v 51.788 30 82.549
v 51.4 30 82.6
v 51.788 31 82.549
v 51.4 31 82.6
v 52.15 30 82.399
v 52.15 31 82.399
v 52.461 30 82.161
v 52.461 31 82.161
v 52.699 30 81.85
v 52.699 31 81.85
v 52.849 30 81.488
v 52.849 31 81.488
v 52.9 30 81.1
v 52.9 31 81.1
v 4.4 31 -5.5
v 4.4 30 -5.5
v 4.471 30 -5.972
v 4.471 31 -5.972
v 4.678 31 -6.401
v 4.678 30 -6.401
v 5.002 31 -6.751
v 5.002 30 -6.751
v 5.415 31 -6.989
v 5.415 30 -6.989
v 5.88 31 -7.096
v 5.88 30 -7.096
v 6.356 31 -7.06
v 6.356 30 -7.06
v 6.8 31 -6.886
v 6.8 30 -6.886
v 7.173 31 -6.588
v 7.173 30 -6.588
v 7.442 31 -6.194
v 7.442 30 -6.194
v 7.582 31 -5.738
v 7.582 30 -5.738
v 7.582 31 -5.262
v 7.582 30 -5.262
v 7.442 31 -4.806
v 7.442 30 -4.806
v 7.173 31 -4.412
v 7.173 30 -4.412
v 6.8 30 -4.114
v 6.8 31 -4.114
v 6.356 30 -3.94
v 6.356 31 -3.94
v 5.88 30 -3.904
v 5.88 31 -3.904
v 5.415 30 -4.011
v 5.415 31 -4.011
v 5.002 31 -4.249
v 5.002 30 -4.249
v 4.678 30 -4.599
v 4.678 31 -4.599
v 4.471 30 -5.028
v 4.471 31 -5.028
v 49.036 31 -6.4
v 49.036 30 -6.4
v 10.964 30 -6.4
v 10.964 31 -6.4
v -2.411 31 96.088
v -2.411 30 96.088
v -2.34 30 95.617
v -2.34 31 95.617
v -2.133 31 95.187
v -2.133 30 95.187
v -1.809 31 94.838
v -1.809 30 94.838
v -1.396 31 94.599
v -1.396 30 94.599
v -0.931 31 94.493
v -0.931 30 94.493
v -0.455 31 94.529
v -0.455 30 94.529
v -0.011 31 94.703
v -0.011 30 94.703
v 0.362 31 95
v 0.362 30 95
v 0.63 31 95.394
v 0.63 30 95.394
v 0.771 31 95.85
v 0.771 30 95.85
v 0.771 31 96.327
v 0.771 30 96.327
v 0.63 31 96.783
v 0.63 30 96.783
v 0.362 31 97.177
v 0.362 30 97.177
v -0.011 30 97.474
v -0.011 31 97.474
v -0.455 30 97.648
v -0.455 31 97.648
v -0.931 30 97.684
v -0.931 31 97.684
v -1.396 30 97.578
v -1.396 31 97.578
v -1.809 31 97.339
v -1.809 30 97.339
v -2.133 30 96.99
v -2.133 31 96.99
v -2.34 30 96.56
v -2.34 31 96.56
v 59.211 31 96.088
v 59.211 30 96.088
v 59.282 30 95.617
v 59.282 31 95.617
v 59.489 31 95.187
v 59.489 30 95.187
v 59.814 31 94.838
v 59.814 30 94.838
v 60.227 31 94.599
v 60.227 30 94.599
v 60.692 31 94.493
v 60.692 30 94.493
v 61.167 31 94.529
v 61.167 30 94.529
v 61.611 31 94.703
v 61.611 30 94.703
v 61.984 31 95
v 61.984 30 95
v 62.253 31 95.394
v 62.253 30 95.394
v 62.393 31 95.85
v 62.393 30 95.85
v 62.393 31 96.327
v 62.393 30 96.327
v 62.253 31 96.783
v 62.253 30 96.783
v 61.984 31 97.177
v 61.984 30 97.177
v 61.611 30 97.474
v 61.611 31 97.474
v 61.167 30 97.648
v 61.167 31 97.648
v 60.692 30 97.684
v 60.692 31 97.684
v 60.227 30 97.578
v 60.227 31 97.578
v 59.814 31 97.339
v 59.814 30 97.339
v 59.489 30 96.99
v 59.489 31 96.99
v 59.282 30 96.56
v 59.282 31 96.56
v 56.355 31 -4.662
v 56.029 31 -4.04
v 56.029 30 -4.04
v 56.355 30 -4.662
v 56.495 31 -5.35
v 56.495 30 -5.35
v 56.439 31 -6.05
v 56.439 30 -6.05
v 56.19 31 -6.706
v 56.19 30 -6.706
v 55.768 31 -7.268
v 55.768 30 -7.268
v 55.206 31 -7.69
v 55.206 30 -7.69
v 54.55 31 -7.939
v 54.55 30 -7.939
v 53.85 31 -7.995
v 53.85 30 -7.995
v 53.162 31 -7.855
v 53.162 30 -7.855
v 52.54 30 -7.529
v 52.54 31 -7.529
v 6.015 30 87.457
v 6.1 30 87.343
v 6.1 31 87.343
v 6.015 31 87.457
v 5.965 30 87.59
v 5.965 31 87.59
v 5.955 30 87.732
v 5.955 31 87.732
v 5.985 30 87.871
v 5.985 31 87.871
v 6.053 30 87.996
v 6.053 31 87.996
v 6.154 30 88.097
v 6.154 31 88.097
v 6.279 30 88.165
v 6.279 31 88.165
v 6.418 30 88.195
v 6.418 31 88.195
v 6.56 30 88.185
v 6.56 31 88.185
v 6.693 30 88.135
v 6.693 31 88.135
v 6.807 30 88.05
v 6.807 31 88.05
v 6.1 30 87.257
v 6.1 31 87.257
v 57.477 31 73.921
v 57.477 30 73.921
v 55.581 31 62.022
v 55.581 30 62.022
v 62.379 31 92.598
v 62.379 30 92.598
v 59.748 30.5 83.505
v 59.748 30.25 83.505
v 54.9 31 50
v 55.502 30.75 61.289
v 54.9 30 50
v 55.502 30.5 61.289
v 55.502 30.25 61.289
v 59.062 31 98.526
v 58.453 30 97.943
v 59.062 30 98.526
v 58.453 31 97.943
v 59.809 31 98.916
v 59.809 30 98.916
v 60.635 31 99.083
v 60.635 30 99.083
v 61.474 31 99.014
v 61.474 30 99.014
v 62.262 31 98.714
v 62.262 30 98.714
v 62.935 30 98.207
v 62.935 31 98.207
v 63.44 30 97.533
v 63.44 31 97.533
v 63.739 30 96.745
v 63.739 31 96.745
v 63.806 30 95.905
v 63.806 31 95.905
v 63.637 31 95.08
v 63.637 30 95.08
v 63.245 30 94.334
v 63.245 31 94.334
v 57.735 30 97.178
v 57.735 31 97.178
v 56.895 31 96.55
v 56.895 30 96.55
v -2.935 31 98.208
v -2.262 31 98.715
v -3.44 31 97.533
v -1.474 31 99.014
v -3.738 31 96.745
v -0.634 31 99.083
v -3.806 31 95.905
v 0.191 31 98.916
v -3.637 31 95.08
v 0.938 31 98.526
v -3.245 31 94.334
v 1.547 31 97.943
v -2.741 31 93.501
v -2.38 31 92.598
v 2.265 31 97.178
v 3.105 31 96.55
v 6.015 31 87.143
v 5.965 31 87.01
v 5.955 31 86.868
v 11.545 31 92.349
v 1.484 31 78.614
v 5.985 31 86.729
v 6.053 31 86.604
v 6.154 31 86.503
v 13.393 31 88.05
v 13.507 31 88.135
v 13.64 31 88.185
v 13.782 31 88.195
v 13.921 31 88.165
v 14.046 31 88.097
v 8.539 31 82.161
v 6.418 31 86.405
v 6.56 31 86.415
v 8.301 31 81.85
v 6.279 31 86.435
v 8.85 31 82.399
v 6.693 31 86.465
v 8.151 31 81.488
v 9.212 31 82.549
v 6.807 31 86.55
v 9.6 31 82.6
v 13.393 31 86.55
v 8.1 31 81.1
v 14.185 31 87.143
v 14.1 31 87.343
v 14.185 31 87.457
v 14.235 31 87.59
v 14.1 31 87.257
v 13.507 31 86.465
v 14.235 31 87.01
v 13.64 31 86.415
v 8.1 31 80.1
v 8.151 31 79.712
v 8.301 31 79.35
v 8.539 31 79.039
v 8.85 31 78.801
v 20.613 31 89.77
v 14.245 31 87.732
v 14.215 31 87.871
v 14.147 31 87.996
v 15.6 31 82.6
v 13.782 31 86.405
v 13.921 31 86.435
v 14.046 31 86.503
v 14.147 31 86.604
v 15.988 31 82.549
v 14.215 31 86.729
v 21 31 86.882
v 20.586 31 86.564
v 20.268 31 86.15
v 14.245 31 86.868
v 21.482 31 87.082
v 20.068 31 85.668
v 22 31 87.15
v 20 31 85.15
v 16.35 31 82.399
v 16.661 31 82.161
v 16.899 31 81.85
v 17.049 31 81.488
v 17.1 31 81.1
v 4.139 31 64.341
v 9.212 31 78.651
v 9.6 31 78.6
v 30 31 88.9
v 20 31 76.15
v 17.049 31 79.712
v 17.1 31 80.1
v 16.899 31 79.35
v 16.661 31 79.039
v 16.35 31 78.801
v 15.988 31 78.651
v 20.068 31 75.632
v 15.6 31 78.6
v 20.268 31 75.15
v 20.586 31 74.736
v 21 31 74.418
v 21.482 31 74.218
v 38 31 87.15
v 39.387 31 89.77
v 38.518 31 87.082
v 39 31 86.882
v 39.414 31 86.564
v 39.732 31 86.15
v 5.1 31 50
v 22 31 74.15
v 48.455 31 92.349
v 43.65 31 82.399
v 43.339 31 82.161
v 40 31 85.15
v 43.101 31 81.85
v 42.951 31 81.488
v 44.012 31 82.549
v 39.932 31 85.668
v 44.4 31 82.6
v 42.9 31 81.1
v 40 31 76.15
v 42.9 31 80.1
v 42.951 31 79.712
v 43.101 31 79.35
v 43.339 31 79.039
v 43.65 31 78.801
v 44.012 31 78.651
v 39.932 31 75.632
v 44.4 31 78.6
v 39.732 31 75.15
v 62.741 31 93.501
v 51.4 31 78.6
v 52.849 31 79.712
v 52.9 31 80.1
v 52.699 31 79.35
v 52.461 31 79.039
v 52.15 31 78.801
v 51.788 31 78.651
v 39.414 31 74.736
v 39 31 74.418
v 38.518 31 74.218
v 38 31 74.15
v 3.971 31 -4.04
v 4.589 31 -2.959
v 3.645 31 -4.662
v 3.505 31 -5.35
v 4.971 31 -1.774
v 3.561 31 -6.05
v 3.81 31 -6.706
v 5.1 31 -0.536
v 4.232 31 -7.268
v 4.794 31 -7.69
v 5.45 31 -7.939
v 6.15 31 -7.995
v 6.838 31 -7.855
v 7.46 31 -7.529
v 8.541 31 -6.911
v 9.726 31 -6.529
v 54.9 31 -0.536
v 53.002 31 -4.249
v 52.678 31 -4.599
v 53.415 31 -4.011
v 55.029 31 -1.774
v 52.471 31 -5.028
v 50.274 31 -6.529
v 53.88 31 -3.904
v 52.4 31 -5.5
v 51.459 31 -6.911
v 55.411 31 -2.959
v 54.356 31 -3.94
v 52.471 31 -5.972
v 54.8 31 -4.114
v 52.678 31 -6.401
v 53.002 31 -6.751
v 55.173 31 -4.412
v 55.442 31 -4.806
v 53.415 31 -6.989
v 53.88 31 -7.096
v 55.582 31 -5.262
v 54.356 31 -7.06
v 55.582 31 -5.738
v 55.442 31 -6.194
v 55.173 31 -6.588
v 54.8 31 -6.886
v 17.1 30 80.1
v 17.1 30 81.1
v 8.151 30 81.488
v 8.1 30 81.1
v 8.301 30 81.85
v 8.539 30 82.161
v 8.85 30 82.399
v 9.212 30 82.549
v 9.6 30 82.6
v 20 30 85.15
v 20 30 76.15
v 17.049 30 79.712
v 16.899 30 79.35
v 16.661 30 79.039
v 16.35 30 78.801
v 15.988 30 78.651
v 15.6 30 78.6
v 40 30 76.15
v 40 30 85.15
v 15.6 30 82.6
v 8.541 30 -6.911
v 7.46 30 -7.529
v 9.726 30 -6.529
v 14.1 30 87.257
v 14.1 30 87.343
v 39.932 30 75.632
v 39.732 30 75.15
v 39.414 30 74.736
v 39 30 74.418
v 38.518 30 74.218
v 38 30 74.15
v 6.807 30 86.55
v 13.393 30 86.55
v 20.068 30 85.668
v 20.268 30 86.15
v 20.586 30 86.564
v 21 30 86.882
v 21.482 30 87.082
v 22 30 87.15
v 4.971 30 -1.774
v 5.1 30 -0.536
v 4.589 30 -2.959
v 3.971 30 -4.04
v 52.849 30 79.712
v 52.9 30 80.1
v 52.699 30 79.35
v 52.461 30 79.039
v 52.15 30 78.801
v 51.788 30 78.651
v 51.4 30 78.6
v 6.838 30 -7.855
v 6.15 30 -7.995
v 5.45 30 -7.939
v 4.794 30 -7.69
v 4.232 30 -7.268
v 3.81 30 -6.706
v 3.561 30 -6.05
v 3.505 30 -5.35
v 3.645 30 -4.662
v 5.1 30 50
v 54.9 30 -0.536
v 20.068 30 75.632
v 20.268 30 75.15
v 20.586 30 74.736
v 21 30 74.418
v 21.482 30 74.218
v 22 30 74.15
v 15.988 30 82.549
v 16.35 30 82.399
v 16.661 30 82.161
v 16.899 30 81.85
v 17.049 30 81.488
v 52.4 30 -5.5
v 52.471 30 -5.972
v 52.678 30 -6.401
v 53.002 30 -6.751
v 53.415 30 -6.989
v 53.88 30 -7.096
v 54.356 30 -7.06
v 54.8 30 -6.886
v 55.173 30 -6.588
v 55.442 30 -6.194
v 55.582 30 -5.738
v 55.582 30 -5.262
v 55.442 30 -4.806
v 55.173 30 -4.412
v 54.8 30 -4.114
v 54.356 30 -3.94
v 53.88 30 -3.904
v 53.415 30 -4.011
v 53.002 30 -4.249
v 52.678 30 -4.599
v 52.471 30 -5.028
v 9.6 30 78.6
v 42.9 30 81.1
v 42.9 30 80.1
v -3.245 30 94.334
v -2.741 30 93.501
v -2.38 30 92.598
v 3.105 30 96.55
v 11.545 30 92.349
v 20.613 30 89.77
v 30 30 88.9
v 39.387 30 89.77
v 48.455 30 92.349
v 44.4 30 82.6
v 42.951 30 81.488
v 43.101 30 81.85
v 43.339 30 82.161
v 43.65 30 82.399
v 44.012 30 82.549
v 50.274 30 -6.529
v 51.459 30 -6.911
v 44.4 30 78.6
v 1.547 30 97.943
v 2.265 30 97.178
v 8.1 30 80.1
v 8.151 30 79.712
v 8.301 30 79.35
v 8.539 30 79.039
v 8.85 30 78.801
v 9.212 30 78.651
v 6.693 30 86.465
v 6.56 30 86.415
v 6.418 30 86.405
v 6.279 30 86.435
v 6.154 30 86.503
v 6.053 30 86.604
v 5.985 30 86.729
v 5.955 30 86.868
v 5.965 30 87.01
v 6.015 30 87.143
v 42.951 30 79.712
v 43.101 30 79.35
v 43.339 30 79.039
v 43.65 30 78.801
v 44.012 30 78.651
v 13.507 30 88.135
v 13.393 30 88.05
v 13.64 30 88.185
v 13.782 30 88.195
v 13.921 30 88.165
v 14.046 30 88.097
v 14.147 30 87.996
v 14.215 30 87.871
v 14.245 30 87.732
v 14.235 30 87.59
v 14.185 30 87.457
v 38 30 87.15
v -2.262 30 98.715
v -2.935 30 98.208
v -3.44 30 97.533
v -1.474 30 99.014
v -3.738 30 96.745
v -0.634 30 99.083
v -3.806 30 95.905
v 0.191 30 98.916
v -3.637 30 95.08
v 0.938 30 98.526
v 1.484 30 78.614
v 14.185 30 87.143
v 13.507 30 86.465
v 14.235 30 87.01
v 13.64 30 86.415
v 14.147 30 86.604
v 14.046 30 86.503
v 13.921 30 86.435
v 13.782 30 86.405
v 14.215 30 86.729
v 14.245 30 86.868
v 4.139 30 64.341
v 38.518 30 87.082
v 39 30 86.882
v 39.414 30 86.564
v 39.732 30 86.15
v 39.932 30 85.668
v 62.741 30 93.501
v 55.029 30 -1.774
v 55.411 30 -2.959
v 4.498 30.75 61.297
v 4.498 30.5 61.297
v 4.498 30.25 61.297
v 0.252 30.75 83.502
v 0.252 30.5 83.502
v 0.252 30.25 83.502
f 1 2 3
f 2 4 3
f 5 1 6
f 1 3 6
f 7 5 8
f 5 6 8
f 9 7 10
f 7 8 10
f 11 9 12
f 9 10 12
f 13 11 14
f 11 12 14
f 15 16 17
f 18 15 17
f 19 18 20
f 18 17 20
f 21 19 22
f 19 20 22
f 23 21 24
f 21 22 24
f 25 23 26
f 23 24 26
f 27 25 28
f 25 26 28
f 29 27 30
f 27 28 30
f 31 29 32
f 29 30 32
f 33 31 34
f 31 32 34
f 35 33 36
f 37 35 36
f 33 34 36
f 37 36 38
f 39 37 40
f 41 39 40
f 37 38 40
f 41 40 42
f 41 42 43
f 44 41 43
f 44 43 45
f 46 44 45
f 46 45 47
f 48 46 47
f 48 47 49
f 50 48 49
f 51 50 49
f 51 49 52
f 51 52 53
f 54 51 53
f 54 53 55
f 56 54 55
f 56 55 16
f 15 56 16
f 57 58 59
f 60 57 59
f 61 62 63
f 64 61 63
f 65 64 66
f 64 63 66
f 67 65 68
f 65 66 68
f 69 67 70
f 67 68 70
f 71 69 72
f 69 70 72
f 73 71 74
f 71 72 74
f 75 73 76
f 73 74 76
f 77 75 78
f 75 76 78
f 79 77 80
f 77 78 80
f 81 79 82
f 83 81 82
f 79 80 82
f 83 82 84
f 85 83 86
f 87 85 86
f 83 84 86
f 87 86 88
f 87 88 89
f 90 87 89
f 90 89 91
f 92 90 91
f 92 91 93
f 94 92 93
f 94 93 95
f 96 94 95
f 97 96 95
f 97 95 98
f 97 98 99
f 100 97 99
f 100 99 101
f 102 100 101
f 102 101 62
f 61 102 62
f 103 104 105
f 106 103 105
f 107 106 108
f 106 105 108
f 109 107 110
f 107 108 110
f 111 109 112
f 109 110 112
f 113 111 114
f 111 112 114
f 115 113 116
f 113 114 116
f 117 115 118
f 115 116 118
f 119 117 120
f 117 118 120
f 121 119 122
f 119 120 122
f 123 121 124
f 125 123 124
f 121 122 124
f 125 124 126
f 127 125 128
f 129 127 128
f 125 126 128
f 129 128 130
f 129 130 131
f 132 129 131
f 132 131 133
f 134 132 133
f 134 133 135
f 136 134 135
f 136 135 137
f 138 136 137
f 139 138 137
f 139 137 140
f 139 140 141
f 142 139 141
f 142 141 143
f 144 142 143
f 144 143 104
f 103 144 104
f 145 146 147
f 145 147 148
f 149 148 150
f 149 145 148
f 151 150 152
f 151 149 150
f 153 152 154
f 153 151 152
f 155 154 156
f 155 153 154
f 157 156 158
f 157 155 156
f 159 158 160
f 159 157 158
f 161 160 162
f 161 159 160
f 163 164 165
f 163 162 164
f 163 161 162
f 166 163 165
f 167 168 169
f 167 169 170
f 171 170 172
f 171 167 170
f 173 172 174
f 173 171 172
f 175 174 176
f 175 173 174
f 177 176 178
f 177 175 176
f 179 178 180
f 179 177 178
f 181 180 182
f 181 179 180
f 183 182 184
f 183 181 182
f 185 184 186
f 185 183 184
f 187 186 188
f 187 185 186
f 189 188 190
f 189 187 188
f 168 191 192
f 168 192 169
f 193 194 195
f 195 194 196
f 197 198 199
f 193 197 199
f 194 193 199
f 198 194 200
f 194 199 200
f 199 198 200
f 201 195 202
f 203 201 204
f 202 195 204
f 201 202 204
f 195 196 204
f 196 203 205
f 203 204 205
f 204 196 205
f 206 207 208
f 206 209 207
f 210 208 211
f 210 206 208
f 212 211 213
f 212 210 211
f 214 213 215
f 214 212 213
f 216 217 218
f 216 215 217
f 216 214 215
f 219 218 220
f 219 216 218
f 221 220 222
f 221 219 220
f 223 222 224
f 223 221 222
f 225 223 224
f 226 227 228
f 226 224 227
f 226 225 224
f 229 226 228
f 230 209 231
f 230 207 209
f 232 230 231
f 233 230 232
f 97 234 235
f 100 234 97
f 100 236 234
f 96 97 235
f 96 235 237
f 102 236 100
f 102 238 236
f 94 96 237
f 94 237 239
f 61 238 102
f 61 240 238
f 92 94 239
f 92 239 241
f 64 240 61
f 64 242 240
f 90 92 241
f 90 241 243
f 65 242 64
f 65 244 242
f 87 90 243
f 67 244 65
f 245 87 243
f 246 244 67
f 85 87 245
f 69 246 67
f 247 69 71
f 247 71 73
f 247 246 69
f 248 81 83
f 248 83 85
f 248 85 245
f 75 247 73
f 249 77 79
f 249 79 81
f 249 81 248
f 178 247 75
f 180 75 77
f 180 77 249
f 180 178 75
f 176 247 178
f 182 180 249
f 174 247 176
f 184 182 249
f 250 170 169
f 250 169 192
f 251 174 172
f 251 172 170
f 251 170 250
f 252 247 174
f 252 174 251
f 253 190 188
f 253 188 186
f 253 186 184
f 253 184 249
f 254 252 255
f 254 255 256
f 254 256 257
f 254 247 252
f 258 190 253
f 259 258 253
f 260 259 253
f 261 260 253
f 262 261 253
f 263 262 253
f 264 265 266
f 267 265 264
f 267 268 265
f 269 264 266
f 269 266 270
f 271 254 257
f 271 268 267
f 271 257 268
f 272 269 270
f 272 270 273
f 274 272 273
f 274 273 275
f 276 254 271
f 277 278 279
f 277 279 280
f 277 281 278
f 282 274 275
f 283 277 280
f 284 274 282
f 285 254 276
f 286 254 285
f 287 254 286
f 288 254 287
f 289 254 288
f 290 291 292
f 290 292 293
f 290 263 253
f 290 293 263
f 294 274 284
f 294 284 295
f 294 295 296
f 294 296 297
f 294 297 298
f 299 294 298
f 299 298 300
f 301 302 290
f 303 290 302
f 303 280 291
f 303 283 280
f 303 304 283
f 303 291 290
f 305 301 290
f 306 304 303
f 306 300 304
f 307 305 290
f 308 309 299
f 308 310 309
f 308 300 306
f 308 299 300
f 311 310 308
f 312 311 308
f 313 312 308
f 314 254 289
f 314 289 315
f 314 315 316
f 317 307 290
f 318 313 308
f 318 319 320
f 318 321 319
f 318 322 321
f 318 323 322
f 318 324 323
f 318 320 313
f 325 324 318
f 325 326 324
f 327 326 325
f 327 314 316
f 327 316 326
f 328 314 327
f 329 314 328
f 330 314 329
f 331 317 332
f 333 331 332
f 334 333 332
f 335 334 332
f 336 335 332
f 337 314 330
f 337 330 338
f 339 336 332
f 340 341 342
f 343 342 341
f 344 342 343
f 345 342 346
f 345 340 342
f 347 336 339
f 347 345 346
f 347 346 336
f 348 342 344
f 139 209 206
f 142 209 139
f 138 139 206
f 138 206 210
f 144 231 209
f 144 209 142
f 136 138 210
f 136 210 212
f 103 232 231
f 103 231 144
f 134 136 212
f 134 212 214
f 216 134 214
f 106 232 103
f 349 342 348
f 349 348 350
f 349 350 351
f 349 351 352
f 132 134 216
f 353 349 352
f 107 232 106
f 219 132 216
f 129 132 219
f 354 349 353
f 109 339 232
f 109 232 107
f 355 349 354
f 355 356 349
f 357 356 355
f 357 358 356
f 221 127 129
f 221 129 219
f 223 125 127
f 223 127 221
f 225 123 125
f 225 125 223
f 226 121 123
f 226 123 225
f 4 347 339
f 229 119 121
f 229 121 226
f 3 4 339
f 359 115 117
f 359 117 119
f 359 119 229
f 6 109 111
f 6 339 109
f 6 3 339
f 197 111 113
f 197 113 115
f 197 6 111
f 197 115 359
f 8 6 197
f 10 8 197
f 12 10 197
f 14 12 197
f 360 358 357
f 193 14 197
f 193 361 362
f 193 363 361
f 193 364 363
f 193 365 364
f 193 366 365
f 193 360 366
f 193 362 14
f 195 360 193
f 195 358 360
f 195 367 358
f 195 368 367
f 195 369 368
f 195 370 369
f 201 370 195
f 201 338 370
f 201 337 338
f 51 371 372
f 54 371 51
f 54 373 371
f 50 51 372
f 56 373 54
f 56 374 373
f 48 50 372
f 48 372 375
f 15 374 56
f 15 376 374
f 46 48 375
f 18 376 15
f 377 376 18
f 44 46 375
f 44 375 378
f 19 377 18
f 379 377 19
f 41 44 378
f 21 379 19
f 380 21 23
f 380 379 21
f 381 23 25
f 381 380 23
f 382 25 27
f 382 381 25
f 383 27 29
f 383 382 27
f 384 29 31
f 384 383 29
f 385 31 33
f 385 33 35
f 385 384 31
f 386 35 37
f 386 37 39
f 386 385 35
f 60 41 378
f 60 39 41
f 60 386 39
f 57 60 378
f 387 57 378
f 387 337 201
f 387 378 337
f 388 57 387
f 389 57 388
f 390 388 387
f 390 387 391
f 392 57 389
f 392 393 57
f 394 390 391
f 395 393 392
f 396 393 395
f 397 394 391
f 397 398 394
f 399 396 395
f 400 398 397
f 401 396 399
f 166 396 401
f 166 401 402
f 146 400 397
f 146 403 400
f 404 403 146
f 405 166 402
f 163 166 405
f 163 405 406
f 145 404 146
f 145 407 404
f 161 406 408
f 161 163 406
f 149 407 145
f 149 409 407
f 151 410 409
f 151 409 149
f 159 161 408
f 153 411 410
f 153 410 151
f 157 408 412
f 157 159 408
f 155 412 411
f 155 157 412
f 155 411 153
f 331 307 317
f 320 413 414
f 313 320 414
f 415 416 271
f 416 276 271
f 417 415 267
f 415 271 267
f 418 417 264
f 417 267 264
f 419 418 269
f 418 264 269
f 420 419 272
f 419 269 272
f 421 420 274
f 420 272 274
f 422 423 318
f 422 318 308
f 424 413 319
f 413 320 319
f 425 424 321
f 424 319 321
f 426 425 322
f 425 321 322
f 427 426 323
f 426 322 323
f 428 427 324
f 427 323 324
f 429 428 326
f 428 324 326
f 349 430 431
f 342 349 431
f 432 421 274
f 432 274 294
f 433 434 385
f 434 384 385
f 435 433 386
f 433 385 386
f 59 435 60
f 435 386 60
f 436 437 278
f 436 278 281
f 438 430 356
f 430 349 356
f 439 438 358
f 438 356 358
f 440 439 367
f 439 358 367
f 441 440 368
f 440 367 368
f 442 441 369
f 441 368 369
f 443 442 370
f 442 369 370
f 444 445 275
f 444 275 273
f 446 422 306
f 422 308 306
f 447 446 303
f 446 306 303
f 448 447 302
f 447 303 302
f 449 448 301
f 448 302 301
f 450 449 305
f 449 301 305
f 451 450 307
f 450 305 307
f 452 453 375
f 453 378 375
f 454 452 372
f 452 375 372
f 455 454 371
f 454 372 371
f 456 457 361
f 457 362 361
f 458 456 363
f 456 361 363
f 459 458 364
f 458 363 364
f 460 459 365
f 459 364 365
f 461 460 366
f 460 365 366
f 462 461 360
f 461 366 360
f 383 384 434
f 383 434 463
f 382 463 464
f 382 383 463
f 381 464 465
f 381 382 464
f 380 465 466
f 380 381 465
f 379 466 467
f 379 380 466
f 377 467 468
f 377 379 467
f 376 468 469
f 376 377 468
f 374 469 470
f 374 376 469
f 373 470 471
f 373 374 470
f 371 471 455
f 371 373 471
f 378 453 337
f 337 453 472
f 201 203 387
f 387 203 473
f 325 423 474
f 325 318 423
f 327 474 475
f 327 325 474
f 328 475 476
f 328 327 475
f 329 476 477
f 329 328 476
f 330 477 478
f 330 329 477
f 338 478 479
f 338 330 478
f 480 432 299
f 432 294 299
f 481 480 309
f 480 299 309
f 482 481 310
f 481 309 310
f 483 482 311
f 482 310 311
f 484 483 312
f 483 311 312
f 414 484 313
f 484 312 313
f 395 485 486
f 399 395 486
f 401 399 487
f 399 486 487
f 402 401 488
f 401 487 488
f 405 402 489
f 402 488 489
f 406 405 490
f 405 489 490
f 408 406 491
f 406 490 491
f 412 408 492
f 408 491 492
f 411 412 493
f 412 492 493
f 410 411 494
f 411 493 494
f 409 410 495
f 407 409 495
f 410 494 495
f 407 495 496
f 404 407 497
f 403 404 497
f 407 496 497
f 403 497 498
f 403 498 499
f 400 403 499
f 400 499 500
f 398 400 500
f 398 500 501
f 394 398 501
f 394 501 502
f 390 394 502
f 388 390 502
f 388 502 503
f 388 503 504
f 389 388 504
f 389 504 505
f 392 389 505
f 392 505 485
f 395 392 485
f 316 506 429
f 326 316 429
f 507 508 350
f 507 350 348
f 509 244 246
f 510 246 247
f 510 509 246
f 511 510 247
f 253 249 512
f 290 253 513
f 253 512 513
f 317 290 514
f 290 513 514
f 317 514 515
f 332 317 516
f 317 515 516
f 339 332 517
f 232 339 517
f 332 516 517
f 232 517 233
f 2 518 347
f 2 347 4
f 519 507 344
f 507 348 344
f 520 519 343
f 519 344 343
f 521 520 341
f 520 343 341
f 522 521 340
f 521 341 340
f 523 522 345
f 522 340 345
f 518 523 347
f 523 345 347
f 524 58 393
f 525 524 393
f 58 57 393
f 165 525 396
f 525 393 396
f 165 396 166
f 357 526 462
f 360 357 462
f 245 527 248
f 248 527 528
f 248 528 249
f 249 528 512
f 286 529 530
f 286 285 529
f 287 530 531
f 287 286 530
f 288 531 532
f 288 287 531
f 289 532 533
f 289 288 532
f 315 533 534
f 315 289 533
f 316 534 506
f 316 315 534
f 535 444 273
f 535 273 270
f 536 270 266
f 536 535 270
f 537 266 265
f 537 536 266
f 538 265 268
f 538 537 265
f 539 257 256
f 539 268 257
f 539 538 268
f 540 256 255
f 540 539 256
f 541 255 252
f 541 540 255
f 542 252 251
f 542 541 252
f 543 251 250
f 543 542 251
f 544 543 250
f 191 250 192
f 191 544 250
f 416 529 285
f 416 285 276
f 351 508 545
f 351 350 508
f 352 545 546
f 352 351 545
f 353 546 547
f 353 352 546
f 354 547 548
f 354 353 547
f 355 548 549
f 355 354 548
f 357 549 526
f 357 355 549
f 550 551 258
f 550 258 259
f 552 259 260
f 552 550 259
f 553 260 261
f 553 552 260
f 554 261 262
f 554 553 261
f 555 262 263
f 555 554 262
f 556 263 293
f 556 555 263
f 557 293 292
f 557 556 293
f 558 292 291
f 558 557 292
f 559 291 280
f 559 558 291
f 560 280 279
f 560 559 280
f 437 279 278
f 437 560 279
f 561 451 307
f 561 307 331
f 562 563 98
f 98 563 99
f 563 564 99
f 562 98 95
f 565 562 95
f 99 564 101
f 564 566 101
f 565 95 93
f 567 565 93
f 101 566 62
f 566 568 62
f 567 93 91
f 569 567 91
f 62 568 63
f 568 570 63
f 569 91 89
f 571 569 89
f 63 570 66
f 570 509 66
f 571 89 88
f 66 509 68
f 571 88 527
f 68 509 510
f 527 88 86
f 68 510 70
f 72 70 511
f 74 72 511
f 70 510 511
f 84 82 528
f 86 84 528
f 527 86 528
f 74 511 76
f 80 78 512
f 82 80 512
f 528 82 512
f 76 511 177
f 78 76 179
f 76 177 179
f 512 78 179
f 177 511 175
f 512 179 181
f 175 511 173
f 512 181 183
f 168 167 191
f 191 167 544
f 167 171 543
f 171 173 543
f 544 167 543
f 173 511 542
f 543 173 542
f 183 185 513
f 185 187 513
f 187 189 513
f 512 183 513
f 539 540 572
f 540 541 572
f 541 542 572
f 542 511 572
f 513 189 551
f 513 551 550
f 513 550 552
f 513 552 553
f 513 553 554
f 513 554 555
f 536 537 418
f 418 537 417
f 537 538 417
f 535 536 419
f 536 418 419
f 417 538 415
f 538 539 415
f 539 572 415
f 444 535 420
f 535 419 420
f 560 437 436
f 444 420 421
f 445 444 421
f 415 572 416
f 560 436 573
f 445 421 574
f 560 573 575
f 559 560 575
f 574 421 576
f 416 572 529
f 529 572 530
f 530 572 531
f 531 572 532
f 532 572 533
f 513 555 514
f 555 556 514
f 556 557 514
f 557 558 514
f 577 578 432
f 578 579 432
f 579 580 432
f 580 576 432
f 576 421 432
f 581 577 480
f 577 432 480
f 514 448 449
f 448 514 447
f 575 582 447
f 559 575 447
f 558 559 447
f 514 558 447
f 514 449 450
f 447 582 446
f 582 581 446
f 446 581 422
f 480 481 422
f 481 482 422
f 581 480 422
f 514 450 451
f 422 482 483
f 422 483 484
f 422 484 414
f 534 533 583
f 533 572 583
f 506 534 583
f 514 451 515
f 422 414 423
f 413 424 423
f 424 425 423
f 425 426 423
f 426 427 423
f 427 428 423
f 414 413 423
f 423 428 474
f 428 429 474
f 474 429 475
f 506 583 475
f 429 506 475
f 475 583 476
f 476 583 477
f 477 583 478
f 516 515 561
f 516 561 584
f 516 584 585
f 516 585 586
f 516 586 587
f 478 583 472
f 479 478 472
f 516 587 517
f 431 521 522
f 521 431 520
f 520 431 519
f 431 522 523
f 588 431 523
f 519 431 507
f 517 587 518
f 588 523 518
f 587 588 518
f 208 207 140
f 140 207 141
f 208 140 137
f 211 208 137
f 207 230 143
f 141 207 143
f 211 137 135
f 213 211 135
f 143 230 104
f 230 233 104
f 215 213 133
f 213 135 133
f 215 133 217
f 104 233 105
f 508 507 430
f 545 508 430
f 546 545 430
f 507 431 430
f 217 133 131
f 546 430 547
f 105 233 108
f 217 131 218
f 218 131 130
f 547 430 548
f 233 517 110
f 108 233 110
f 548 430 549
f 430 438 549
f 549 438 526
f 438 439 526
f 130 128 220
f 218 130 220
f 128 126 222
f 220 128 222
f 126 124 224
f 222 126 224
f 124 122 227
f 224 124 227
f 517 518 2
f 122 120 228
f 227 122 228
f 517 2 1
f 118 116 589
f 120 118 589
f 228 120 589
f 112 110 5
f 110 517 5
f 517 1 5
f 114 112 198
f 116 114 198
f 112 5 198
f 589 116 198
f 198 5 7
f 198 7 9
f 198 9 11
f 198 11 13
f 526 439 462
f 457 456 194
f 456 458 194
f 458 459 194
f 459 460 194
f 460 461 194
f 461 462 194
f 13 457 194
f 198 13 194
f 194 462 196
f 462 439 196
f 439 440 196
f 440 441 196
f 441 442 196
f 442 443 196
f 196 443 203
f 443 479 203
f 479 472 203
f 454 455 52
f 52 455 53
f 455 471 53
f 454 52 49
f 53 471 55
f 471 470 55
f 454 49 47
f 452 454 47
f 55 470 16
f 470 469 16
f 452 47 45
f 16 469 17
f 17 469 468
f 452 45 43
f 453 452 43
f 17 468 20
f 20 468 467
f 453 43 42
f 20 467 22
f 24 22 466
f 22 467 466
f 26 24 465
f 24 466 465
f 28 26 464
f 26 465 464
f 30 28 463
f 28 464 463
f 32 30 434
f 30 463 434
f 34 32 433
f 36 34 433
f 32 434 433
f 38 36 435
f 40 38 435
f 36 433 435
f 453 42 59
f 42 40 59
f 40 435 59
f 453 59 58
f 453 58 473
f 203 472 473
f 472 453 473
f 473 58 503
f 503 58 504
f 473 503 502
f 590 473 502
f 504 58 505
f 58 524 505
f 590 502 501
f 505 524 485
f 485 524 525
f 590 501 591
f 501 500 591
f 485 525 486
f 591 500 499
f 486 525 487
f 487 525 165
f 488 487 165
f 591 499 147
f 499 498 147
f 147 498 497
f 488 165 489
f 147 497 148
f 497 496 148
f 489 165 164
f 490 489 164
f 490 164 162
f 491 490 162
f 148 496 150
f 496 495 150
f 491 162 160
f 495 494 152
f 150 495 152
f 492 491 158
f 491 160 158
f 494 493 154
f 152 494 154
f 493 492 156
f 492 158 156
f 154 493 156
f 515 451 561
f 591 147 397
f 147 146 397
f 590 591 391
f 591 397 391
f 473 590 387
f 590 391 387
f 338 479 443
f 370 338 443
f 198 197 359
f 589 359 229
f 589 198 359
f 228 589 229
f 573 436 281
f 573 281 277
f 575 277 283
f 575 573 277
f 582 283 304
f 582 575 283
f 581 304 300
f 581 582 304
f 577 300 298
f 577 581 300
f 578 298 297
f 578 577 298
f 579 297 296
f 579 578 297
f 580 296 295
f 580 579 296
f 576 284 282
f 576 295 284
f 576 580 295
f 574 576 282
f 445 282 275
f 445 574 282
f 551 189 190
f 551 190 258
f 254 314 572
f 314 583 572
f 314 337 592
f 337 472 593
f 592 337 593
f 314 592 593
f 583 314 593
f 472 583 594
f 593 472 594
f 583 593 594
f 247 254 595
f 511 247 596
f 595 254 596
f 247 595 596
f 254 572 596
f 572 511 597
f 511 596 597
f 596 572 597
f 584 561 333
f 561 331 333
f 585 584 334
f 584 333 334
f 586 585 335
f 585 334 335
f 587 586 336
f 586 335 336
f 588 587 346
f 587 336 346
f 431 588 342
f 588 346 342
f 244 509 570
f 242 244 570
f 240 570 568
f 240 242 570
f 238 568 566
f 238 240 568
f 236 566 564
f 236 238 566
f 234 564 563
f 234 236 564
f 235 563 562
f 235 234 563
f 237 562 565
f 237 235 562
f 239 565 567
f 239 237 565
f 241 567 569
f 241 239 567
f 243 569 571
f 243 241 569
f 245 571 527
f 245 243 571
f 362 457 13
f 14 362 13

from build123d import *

# Parameters (mm, degrees)
COVER_MAIN_BOARD_1_START = 30
COVER_MAIN_BOARD_1_DEPTH = 1
SKETCH_2_R               = 2.5
SKETCH_2_R_2             = 3
EXTRUDE_1_DEPTH          = 1
FILLET_1_R               = 6
HOLE_WIZARD_M31_D        = 3.2
SKETCH_5_W               = 20
SKETCH_5_H               = 13
CUT_EXTRUDE_2_DEPTH      = 118.861812366
FILLET_2_R               = 2
CUT_EXTRUDE_3_DEPTH      = 118.861812366
SKETCH_7_W               = 10
SKETCH_7_H               = 4
SKETCH_7_W_2             = 9
CUT_EXTRUDE_4_DEPTH      = 118.861812366
FILLET_3_R               = 1.5


# Read off the part's stored shape, not the designer's step: Припуск-Cover_main_board-1
with BuildPart() as part:
    # Припуск-Cover_main_board-1 outline → Припуск-Cover_main_board-1 (new body)
    with BuildSketch(Plane(origin=(0, 0, 0), x_dir=(1, 0, 0), z_dir=(0, 1, 0)).offset(COVER_MAIN_BOARD_1_START)):
        with BuildLine():
            ThreePointArc((58.536662962, -97.610509717), (61.872887908, -97.542255565), (62.936422695, -94.379353532))
            add(Edge.make_bspline(
                [(62.936422695, -94.379353532), (61.798177223, -90.776493028), (60.72075986, -87.155811957), (58.774674414, -79.85329338), (57.908149184, -76.177190929), (56.466060339, -68.758031881), (55.893308454, -65.032046108), (55.109773151, -57.544971093), (54.899999704, -53.783069267), (54.9, -50)],
                knots=[0, 0, 0, 0, 0.25, 0.25, 0.5, 0.5, 0.75, 0.75, 1, 1, 1, 1], degree=3))
            Line((54.9, -50), (54.9, 6.4))
            Line((54.9, 6.4), (5.1, 6.4))
            Line((5.1, 6.4), (5.1, -50))
            add(Edge.make_bspline(
                [(5.1, -50), (5.099991031, -53.776486453), (4.890826579, -57.541590974), (4.10432522, -65.051764617), (3.53002006, -68.780548712), (2.088476888, -76.191600122), (1.222062078, -79.86132679), (-0.718312327, -87.143485068), (-1.7924779, -90.75713228), (-2.928662588, -94.354417399)],
                knots=[0, 0, 0, 0, 0.25, 0.25, 0.5, 0.5, 0.75, 0.75, 1, 1, 1, 1], degree=3))
            ThreePointArc((-2.928662588, -94.354417399), (-1.883263044, -97.534459074), (1.463338472, -97.610508751))
            ThreePointArc((1.463338472, -97.610508751), (30.000000864, -88.89999981), (58.536662962, -97.610509717))
        make_face()
    extrude(amount=COVER_MAIN_BOARD_1_DEPTH)

    # Эскиз2 → Бобышка-Вытянуть1 (add)
    with BuildSketch(Plane(origin=(0, 31, 0), x_dir=(1, 0, 0), z_dir=(0, 1, 0))):
        with Locations((6, 5.5)):
            Circle(SKETCH_2_R)
        with Locations((54, 5.5)):
            Circle(SKETCH_2_R)
        with Locations((-0.811267397, -96.088490424)):
            Circle(SKETCH_2_R_2)
        with Locations((60.811267397, -96.088490424)):
            Circle(SKETCH_2_R_2)
    extrude(amount=-EXTRUDE_1_DEPTH)

    # Скругление1
    fillet_1_edges = [part.edges().sort_by_distance(p)[0] for p in [
        (-2.75519034, 30.5, 93.803503862),
        (1.934506666, 30.5, 97.297094907),
        (58.065493335, 30.5, 97.297094908),
        (62.755023846, 30.5, 93.803362229),
        (54.9, 30.5, -3.167619242),
        (51.667619242, 30.5, -6.4),
        (8.332380758, 30.5, -6.4),
        (5.1, 30.5, -3.167619242),
    ]]
    fillet(fillet_1_edges, radius=FILLET_1_R)

    # Отверстие с зазором M31 (through all)
    with Locations(Plane(origin=(0, 31, 0), x_dir=(1, 0, 0), z_dir=(0, 1, 0))):
        with Locations((-0.811267397, -96.088490424), (60.811267397, -96.088490424), (54, 5.5), (6, 5.5)):
            Hole(HOLE_WIZARD_M31_D / 2)

    # Эскиз5 → Вырез-Вытянуть2 (cut, through all)
    with BuildSketch(Plane.XZ.offset(-30)):
        with Locations((30, 80.64999981)):
            Rectangle(SKETCH_5_W, SKETCH_5_H)
    extrude(amount=-CUT_EXTRUDE_2_DEPTH, mode=Mode.SUBTRACT)

    # Скругление2
    fillet_2_edges = [part.edges().sort_by_distance(p)[0] for p in [
        (40, 30.5, 87.14999981),
        (40, 30.5, 74.14999981),
        (20, 30.5, 74.14999981),
        (20, 30.5, 87.14999981),
    ]]
    fillet(fillet_2_edges, radius=FILLET_2_R)

    # Эскиз6 → Вырез-Вытянуть3 (cut, through all)
    with BuildSketch(Plane.XZ.offset(-30)):
        with BuildLine():
            Line((6.807106781, 88.05), (13.392893219, 88.05))
            ThreePointArc((13.392893219, 88.05), (14.1, 88.05), (14.1, 87.342893219))
            Line((14.1, 87.342893219), (14.1, 87.257106781))
            ThreePointArc((14.1, 87.257106781), (14.1, 86.55), (13.392893219, 86.55))
            Line((13.392893219, 86.55), (6.807106781, 86.55))
            ThreePointArc((6.807106781, 86.55), (6.1, 86.55), (6.1, 87.257106781))
            Line((6.1, 87.257106781), (6.1, 87.342893219))
            ThreePointArc((6.1, 87.342893219), (6.1, 88.05), (6.807106781, 88.05))
        make_face()
    extrude(amount=-CUT_EXTRUDE_3_DEPTH, mode=Mode.SUBTRACT)

    # Эскиз7 → Вырез-Вытянуть4 (cut, through all)
    with BuildSketch(Plane.XZ.offset(-30)):
        with Locations((47.9, 80.6)):
            Rectangle(SKETCH_7_W, SKETCH_7_H)
        with Locations((12.6, 80.6)):
            Rectangle(SKETCH_7_W_2, SKETCH_7_H)
    extrude(amount=-CUT_EXTRUDE_4_DEPTH, mode=Mode.SUBTRACT)

    # Скругление3
    fillet_3_edges = [part.edges().sort_by_distance(p)[0] for p in [
        (42.9, 30.5, 78.6),
        (42.9, 30.5, 82.6),
        (52.9, 30.5, 82.6),
        (52.9, 30.5, 78.6),
        (17.1, 30.5, 82.6),
        (17.1, 30.5, 78.6),
        (8.1, 30.5, 78.6),
        (8.1, 30.5, 82.6),
    ]]
    fillet(fillet_3_edges, radius=FILLET_3_R)


solid = part.part
